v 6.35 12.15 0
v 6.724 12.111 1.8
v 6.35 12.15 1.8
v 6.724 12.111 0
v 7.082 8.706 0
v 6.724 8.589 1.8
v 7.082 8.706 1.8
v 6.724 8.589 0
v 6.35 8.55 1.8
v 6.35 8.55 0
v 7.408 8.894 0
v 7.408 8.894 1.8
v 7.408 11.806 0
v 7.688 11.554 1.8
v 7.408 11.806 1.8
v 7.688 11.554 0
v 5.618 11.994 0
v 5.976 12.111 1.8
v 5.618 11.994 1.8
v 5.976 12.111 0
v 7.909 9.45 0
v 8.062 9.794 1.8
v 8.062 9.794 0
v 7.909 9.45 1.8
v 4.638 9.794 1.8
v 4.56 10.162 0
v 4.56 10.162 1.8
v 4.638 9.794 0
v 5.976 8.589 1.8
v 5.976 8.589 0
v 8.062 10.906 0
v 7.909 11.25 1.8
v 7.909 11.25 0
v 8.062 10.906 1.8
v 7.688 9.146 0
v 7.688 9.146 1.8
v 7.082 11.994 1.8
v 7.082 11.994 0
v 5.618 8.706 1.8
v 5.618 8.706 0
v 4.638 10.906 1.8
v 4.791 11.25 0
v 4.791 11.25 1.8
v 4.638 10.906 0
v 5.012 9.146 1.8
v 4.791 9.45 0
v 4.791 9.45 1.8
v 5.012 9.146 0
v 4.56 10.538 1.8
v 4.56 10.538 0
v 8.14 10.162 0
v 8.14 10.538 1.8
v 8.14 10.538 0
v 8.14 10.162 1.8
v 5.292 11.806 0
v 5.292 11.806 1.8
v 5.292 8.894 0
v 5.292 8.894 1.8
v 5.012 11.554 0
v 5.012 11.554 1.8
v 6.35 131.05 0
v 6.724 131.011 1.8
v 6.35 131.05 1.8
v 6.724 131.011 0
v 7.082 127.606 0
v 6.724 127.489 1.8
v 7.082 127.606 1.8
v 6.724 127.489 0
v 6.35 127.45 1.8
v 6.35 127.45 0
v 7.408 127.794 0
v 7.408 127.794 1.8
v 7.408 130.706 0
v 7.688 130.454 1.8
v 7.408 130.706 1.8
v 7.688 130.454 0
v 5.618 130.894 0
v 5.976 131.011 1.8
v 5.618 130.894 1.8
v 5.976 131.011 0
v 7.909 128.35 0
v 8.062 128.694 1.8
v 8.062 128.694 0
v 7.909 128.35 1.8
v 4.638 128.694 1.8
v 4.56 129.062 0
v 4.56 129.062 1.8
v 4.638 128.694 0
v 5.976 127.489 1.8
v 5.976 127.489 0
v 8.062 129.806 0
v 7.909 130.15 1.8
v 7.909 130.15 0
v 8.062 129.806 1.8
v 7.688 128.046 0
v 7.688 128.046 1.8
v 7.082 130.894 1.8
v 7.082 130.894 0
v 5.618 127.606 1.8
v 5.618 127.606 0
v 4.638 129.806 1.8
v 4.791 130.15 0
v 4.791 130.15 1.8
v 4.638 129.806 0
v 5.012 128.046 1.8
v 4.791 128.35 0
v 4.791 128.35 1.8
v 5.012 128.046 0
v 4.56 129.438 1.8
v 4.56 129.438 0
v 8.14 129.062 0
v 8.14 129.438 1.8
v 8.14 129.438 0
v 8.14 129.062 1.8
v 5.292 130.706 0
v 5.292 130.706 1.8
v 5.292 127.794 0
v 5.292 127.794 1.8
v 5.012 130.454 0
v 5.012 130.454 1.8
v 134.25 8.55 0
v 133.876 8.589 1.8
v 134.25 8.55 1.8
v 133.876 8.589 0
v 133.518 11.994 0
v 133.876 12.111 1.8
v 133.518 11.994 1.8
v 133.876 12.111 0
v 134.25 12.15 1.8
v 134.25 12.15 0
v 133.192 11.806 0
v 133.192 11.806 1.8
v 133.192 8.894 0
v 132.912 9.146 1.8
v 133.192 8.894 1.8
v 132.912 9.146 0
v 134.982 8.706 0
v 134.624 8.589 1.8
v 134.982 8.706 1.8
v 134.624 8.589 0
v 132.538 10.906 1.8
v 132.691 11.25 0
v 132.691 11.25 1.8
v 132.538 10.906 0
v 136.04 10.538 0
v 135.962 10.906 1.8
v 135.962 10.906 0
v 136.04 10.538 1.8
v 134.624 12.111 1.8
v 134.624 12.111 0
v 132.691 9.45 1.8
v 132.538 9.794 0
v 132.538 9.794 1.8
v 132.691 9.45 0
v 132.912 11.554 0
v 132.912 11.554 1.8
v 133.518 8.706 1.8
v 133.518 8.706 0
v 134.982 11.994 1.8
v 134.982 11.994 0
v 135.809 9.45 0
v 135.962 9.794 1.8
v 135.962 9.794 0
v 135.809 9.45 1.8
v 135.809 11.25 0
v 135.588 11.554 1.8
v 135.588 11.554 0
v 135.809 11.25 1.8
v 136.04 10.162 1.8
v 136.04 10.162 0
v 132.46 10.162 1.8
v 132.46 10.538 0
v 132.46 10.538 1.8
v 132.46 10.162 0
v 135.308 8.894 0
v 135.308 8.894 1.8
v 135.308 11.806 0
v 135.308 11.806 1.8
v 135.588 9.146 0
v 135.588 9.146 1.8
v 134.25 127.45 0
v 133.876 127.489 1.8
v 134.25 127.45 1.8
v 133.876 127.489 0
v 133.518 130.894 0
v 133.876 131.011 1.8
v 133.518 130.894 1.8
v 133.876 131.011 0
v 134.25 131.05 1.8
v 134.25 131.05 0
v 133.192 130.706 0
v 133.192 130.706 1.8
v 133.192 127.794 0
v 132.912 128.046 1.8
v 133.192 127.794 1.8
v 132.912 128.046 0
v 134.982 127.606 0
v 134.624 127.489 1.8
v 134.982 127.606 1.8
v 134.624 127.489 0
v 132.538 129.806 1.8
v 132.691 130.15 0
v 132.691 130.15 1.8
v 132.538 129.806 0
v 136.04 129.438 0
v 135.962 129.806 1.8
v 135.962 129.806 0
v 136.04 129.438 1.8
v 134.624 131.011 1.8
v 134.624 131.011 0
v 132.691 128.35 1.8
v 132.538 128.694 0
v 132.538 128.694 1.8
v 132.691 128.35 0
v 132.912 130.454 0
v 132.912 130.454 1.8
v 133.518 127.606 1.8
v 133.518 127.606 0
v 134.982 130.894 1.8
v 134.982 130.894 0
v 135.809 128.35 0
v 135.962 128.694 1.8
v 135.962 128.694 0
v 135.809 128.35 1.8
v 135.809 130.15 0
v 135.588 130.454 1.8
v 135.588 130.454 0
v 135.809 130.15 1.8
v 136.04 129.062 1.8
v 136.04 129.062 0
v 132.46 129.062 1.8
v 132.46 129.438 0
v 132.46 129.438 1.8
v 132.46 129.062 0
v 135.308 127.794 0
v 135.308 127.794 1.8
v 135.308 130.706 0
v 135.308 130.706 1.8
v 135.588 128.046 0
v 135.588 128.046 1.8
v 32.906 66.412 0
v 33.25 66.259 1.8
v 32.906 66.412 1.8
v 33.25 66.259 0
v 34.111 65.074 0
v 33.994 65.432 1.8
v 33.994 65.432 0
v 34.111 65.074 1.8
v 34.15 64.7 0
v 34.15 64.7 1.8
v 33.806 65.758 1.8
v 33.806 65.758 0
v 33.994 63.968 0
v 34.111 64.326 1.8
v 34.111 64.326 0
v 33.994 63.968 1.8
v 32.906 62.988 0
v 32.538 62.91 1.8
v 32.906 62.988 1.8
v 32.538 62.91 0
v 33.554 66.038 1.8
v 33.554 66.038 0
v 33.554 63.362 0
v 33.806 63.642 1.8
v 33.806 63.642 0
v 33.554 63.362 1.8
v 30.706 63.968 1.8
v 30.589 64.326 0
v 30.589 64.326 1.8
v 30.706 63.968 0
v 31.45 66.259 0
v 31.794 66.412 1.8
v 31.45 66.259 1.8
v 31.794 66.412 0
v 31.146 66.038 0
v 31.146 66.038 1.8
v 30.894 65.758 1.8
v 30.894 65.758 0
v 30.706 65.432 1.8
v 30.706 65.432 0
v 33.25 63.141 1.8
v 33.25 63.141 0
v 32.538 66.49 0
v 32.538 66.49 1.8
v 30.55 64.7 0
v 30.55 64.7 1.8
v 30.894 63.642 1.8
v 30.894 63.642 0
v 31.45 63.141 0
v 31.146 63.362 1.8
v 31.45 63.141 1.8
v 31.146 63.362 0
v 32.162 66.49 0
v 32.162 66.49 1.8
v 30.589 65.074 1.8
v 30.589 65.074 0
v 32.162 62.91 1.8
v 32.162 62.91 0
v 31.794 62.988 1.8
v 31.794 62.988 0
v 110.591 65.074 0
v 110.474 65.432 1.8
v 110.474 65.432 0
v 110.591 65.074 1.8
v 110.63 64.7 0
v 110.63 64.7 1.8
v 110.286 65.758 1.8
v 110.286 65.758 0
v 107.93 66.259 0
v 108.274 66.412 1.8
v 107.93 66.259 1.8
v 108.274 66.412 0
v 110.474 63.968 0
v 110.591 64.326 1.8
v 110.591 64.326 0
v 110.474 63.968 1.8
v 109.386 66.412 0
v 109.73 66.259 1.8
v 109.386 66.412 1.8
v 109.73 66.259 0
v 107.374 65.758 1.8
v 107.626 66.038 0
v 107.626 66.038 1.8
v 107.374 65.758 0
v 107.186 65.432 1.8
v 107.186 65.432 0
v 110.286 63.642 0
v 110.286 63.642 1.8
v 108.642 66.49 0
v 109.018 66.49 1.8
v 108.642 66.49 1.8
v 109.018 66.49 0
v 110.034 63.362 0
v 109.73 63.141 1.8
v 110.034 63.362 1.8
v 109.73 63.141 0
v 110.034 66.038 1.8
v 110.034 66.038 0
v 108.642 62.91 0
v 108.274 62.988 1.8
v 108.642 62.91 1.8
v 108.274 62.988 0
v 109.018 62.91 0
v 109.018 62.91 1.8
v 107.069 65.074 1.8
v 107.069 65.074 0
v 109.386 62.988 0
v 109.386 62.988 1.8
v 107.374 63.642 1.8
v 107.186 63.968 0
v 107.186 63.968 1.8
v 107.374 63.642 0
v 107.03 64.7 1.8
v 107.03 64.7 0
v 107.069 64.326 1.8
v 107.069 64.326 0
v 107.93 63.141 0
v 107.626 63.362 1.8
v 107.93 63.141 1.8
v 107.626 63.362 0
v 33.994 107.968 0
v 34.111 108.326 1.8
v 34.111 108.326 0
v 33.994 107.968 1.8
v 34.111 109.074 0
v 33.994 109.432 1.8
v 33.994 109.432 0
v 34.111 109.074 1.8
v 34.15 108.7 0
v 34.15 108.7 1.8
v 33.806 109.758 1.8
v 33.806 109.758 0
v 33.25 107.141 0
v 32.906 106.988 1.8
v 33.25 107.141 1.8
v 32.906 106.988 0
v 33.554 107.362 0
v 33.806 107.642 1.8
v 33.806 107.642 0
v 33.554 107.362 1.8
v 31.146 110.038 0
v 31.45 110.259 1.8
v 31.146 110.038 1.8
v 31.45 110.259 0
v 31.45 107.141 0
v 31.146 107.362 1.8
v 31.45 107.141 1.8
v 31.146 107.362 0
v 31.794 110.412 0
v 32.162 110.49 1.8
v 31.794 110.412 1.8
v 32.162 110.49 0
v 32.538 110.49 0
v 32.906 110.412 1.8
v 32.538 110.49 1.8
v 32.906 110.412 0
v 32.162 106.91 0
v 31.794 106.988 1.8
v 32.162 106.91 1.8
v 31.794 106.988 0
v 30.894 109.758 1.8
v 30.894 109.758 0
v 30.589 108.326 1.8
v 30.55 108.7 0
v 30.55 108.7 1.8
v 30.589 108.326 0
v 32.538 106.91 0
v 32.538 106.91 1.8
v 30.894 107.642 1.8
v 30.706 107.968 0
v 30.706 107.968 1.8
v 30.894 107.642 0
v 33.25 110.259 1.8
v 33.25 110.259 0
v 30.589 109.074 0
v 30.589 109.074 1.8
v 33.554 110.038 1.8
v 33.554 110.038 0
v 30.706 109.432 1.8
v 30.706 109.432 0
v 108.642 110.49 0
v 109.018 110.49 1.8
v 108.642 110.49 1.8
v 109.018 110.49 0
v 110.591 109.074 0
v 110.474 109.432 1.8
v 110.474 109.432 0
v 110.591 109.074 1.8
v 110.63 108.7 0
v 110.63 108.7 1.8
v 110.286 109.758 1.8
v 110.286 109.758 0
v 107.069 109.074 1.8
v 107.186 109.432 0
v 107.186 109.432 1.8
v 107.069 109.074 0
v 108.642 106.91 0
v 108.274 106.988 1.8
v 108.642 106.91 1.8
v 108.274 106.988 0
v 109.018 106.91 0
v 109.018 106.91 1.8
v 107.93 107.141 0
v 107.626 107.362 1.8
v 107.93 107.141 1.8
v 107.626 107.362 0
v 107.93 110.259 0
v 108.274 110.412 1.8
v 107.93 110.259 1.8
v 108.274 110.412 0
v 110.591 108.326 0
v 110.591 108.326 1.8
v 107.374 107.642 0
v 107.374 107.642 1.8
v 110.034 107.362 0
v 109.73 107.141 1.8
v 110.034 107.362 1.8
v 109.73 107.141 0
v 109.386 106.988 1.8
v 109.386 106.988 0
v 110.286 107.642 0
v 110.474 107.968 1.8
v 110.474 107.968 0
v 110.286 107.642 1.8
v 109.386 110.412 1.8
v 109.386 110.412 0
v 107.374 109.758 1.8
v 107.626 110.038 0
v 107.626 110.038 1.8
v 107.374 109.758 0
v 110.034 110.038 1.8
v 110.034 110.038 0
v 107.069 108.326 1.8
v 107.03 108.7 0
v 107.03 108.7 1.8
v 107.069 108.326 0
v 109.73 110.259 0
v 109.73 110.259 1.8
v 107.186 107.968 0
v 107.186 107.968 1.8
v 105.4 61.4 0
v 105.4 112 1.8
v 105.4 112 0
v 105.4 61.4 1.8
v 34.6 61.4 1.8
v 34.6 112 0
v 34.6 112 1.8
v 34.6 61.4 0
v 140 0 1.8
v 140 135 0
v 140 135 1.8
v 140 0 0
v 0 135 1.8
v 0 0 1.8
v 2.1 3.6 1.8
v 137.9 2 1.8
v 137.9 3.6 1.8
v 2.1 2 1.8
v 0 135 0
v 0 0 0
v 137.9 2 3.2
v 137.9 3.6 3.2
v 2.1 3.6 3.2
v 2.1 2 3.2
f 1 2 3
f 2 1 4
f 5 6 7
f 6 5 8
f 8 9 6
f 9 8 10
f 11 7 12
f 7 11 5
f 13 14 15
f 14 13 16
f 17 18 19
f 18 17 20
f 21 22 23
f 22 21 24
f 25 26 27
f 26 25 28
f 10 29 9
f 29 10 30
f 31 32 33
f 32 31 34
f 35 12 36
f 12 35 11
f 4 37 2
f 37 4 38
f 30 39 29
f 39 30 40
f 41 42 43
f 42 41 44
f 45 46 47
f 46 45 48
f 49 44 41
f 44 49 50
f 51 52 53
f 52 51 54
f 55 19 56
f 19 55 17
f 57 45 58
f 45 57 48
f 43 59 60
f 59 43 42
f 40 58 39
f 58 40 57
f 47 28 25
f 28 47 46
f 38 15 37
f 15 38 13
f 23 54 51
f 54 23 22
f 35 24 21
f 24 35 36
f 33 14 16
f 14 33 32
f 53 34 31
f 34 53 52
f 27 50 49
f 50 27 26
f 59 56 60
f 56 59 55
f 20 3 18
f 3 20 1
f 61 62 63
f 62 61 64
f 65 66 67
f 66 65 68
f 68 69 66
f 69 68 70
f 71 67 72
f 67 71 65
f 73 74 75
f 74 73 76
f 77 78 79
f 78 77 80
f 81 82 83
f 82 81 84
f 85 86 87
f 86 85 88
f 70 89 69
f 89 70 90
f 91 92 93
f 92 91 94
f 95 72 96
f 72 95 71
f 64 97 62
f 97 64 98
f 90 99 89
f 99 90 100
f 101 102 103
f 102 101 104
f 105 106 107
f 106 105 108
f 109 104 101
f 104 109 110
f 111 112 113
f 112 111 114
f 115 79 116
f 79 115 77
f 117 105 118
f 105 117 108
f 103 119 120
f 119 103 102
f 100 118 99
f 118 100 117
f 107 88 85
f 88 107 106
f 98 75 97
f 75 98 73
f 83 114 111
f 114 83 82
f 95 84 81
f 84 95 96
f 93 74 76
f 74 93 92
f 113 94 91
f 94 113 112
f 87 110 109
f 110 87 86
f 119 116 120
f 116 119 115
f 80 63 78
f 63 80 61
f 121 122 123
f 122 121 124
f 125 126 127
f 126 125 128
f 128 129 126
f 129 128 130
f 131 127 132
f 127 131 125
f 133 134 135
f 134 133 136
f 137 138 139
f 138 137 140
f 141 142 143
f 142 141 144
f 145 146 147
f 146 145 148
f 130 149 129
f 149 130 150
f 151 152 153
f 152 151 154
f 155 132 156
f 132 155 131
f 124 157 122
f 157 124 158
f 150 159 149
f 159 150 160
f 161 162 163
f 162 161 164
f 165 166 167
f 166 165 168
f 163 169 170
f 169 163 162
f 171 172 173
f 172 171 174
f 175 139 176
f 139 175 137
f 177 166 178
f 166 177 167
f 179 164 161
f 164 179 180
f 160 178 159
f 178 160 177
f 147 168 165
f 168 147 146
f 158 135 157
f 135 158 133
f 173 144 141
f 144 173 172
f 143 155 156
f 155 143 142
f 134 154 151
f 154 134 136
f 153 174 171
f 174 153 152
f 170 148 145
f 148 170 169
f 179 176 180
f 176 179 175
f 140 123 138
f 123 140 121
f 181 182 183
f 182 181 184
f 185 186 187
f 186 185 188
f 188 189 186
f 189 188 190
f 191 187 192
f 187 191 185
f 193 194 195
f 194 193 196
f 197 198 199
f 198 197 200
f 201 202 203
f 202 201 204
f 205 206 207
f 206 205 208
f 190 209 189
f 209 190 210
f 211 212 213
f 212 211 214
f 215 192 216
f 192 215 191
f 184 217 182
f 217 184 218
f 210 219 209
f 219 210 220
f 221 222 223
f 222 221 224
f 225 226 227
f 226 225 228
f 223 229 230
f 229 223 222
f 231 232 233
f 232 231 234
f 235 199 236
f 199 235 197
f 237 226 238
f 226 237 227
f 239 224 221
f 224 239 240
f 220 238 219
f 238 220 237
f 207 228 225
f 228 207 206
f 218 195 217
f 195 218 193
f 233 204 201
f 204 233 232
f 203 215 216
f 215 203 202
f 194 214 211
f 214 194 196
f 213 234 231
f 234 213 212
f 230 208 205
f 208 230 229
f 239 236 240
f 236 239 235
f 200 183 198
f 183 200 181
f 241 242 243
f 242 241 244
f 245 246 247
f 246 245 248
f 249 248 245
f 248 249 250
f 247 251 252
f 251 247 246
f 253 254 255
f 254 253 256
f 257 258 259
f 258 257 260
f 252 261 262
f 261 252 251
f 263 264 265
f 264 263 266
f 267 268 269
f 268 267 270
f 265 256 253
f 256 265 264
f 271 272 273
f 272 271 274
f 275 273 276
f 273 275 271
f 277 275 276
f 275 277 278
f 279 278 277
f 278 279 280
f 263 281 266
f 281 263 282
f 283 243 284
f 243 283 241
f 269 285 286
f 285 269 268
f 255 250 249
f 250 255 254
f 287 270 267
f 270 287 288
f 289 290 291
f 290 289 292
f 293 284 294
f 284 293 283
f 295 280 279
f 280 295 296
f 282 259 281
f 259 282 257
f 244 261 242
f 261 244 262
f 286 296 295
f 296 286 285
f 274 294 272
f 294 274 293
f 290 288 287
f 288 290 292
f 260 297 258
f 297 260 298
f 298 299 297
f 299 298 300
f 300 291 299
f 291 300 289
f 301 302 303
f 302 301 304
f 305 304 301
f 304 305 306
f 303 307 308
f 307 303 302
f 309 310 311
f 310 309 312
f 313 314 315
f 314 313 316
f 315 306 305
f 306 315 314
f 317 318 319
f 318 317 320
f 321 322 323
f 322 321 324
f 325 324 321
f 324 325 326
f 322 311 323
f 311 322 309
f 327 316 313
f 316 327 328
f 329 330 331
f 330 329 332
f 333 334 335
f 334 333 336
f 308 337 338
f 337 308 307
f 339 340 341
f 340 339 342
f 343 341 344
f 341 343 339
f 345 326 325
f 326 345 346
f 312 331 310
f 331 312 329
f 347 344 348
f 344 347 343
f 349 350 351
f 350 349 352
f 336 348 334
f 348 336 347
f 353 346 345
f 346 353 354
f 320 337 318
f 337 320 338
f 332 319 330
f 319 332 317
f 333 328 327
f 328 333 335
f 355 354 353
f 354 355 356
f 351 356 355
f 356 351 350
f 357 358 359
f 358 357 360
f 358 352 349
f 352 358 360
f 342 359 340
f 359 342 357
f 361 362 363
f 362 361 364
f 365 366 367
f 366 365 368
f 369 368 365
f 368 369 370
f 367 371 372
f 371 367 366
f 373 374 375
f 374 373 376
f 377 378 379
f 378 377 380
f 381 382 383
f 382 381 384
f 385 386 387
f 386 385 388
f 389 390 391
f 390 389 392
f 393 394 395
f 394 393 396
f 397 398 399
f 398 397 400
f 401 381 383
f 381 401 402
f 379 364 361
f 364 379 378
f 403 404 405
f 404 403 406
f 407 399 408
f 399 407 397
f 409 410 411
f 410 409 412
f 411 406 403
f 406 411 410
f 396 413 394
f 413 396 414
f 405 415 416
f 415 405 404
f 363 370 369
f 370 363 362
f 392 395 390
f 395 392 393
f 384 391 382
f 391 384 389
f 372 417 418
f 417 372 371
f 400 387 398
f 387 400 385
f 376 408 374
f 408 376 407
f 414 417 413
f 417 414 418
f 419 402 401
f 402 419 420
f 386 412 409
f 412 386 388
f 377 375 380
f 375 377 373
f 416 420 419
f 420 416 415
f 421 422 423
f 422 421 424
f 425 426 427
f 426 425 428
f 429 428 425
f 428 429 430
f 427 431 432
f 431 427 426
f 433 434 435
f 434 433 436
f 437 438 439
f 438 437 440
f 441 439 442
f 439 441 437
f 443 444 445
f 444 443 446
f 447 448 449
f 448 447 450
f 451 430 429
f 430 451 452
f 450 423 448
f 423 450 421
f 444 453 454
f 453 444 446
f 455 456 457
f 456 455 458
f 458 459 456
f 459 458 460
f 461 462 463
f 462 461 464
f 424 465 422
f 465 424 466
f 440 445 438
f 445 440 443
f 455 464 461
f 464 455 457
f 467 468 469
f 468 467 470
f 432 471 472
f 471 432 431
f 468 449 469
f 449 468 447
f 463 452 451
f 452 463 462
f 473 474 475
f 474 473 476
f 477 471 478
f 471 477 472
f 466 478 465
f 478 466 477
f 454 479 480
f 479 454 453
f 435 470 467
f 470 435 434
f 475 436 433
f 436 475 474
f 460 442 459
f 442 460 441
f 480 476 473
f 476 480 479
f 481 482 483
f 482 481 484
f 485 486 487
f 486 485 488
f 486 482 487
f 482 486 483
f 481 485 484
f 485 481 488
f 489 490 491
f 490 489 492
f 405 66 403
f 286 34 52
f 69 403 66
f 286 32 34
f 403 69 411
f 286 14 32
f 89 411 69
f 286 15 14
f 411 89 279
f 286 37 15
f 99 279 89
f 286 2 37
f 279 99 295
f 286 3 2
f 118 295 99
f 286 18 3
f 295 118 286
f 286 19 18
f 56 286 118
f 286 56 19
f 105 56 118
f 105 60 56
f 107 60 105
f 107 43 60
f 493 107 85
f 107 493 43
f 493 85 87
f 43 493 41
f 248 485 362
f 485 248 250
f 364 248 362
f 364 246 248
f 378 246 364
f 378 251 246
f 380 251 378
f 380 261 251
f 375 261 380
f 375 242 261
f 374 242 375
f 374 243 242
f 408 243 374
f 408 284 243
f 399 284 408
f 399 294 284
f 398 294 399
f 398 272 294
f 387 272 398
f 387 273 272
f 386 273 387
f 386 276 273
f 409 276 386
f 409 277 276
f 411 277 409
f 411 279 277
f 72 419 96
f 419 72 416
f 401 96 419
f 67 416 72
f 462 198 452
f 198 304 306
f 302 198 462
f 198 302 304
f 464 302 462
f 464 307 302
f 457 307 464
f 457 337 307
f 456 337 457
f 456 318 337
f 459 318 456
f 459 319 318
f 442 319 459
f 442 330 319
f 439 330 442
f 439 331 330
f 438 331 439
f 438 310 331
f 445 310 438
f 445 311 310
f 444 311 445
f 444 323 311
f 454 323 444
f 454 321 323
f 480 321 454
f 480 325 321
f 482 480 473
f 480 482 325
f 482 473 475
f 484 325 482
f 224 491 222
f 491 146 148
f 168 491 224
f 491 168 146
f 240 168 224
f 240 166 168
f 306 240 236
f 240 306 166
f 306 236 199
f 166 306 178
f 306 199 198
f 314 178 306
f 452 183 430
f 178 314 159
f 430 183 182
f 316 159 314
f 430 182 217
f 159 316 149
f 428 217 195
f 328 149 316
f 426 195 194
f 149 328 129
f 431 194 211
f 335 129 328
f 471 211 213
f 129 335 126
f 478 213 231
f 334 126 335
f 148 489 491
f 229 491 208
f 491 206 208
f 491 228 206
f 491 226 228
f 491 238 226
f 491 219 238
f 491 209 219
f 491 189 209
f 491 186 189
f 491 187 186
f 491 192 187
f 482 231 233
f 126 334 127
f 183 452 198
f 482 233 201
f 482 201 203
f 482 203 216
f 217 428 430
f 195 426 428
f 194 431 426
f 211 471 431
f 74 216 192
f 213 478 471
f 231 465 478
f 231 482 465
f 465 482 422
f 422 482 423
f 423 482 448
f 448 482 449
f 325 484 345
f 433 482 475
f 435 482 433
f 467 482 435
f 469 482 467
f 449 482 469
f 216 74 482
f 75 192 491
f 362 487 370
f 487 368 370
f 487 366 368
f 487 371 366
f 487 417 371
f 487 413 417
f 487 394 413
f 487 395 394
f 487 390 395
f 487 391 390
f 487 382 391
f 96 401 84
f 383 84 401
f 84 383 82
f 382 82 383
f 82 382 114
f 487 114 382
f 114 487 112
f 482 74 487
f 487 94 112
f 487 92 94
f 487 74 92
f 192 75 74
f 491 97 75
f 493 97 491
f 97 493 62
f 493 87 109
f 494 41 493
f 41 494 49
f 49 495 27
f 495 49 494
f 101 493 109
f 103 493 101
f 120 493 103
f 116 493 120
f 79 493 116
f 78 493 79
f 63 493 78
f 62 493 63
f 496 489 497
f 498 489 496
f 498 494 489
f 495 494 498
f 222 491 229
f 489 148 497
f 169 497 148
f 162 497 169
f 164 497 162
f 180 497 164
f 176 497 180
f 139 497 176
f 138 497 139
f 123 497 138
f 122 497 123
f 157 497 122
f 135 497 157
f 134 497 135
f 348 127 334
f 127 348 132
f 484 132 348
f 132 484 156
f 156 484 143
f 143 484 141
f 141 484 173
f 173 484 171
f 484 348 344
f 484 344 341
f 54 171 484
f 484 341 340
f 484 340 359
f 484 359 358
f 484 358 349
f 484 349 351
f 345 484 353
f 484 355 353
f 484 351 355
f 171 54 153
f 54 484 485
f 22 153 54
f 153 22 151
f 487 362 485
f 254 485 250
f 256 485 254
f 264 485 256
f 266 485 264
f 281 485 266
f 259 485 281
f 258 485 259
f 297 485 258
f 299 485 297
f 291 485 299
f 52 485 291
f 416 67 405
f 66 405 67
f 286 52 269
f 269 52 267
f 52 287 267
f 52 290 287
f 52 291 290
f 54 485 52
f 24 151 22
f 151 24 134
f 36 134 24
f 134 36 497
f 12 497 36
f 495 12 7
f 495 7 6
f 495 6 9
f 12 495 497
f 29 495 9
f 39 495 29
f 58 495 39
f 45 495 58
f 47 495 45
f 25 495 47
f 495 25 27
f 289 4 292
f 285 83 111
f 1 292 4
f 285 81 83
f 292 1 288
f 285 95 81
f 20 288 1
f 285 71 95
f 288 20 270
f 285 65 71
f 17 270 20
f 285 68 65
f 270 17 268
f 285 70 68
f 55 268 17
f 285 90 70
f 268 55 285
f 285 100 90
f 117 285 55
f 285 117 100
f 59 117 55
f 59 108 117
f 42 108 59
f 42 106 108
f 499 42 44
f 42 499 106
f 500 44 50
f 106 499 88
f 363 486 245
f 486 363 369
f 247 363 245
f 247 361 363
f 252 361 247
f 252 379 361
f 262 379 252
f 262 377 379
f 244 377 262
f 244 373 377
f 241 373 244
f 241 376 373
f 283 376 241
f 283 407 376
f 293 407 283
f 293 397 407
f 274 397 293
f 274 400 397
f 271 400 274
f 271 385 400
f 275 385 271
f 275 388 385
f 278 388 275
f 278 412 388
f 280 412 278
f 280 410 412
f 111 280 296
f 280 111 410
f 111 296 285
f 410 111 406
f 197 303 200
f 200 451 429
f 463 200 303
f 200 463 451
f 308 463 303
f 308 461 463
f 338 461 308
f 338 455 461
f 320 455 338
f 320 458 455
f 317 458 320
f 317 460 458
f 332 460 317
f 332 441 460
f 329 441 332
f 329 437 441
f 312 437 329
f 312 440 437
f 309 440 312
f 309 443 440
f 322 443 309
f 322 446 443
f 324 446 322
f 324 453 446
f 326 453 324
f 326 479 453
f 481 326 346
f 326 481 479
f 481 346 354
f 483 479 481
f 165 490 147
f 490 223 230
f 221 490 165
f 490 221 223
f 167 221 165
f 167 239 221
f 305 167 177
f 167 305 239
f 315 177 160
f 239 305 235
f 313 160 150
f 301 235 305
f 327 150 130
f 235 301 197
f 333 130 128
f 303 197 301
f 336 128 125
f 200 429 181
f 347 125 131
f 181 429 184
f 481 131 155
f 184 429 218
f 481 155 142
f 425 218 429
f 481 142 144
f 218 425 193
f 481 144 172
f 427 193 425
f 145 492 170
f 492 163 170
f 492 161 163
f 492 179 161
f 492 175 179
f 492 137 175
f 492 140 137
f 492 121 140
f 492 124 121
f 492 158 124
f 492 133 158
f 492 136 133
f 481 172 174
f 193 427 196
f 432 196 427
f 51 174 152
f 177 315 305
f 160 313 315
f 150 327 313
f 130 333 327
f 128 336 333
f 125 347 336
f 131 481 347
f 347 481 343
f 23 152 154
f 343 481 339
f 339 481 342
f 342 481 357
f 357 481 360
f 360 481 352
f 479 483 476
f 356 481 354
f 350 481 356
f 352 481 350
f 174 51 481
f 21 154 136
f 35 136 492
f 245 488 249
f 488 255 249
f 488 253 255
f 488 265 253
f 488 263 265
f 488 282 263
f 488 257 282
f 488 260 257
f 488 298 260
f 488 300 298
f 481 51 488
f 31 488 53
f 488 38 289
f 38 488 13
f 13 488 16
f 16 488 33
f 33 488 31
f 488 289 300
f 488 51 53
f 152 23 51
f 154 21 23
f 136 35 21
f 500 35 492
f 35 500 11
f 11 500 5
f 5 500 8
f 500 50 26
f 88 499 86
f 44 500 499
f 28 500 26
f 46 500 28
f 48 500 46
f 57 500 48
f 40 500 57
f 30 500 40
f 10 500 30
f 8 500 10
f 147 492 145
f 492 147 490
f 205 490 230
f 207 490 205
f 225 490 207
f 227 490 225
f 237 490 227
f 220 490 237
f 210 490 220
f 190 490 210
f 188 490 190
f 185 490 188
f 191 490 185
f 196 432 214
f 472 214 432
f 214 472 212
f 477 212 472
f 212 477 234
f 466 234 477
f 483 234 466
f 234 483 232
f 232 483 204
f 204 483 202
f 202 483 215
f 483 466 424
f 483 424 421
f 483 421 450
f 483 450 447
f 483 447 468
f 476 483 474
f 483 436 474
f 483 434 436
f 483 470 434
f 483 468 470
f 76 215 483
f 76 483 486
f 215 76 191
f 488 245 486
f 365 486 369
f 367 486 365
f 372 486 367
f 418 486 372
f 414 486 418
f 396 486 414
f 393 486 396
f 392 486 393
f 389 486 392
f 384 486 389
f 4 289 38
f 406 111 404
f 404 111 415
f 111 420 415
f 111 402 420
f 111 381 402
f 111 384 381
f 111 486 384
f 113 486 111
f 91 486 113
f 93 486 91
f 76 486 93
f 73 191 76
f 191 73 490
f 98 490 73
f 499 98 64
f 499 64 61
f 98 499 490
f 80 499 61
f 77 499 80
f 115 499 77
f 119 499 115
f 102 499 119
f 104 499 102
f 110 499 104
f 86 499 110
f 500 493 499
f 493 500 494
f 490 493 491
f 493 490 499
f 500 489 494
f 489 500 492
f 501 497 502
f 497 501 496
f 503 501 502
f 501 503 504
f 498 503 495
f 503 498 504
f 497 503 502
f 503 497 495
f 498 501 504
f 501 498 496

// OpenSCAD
wall_thickness = 1.8;
case_depth = 135;
case_width = 140;
case_height = 60;



// All holes/openings should be offset from hole 1, at 0,0
lcd_hole_1_x = 0;
lcd_hole_1_y = 0;

lcd_hole_2_x = 86-3-6.92+0.4; // Moving 0.4 right
lcd_hole_2_y = lcd_hole_1_y;

lcd_hole_3_x = lcd_hole_1_x;
lcd_hole_3_y = 50-3-3;

lcd_hole_4_x = lcd_hole_2_x;
lcd_hole_4_y = lcd_hole_3_y;

lcd_hole_radius = 1.8;

lcd_opening_x = 2.25;
lcd_opening_y = -3.3;
lcd_opening_x_length = 70.2 + 0.6;  // Moving 0.6 out
lcd_opening_y_length = 50.6;

offset_visual_x = -lcd_opening_x-lcd_opening_x_length/2+case_width/2;
offset_visual_y = case_depth/3*2-lcd_opening_y_length/2;


module lcd_holes() {
    translate([lcd_hole_1_x, lcd_hole_1_y, 0]) cylinder(h=wall_thickness*3, r=lcd_hole_radius, center=true, $fn=30);
    translate([lcd_hole_2_x, lcd_hole_2_y, 0]) cylinder(h=wall_thickness*3, r=lcd_hole_radius, center=true, $fn=30);
    translate([lcd_hole_3_x, lcd_hole_3_y, 0]) cylinder(h=wall_thickness*3, r=lcd_hole_radius, center=true, $fn=30);
    translate([lcd_hole_4_x, lcd_hole_4_y, 0]) cylinder(h=wall_thickness*3, r=lcd_hole_radius, center=true, $fn=30);
    translate([lcd_opening_x, lcd_opening_y, -1]) cube([lcd_opening_x_length, lcd_opening_y_length, wall_thickness*3]);
}


module captive_square_nut_post(post_top_at, attached_wall_thickness, rotation=0, holes_only=0) {
    nut_width = 5.5;
    nut_height = 2.5;

    nut_post_width = nut_width + 3.6;

    nut_hole_height = nut_height + 0.8;
    nut_hole_width = nut_width + 1;
    nut_hole_depth = (nut_post_width-nut_width)/2 + nut_width + 0.6;

    nut_hole_from_top_of_post = 2;

    screw_radius = 1.8;
    captive_screw_length = 12;


    nut_post_height = nut_hole_from_top_of_post*2 + nut_hole_height + (nut_post_width) + max(0, captive_screw_length - (nut_hole_from_top_of_post*2 + nut_hole_height ));  // This needs to change


    module make_nut_post_holes() {
        // The nut hole        
        translate([(nut_post_width-nut_hole_width)/2,-0.1-attached_wall_thickness,(nut_post_height-nut_hole_from_top_of_post-nut_hole_height )]) cube([nut_hole_width, nut_hole_depth+attached_wall_thickness+0.1, nut_hole_height]);
        
        // The screw hole
        translate([nut_post_width/2,nut_post_width/2,7]) cylinder(r=screw_radius, h=nut_post_height+2, $fn=30);
    }


    module make_post(holes_only=0) {
        // This makes the rotateable post/holes
        if(holes_only == 0) {        
            difference() {
                // The post itself
                cube([nut_post_width, nut_post_width, nut_post_height]);
                // The nut post holes (nut hole, screw hole)
                make_nut_post_holes();
                // The cut to make the post 45 degrees
                rotate([-45,0,0]) translate([-0.05,-0.05,0]) cube([nut_post_width+.1, nut_post_width+.1, nut_post_height]);
            }
        } else {
            // JUST The nut post holes (nut hole, screw hole), but on the same orientation as the post
            make_nut_post_holes();        
        }    
    }




    translate([nut_post_width/2, nut_post_width/2, (post_top_at-nut_post_height)]) rotate([0, 0, rotation]) translate([-nut_post_width/2, -nut_post_width/2, 0]) make_post(holes_only);
}




top_of_post = 0;


difference() {
    cube([case_width, case_depth, wall_thickness]);


    // Front left nut hole
    #translate([wall_thickness, wall_thickness+4, 0]) captive_square_nut_post(top_of_post, wall_thickness, rotation=270, holes_only=1);
    // Back left nut hole    
    #translate([wall_thickness, case_depth-wall_thickness-8.5, 0]) captive_square_nut_post(top_of_post, wall_thickness, rotation=270, holes_only=1);


    // Front right nut hole
    translate([case_width-wall_thickness-8.5, wall_thickness+4, 0]) captive_square_nut_post(top_of_post, wall_thickness, rotation=90, holes_only=1);
    // Back right nut hole    
    translate([case_width-wall_thickness-8.5, case_depth-wall_thickness-8.5, 0]) captive_square_nut_post(top_of_post, wall_thickness, rotation=90, holes_only=1);
    
    #translate([offset_visual_x, offset_visual_y, 0]) lcd_holes();
}

// Alignment ridge
translate([wall_thickness+0.3,2,wall_thickness]) cube([case_width-2*wall_thickness-0.6, 1.6, 1.4]);
